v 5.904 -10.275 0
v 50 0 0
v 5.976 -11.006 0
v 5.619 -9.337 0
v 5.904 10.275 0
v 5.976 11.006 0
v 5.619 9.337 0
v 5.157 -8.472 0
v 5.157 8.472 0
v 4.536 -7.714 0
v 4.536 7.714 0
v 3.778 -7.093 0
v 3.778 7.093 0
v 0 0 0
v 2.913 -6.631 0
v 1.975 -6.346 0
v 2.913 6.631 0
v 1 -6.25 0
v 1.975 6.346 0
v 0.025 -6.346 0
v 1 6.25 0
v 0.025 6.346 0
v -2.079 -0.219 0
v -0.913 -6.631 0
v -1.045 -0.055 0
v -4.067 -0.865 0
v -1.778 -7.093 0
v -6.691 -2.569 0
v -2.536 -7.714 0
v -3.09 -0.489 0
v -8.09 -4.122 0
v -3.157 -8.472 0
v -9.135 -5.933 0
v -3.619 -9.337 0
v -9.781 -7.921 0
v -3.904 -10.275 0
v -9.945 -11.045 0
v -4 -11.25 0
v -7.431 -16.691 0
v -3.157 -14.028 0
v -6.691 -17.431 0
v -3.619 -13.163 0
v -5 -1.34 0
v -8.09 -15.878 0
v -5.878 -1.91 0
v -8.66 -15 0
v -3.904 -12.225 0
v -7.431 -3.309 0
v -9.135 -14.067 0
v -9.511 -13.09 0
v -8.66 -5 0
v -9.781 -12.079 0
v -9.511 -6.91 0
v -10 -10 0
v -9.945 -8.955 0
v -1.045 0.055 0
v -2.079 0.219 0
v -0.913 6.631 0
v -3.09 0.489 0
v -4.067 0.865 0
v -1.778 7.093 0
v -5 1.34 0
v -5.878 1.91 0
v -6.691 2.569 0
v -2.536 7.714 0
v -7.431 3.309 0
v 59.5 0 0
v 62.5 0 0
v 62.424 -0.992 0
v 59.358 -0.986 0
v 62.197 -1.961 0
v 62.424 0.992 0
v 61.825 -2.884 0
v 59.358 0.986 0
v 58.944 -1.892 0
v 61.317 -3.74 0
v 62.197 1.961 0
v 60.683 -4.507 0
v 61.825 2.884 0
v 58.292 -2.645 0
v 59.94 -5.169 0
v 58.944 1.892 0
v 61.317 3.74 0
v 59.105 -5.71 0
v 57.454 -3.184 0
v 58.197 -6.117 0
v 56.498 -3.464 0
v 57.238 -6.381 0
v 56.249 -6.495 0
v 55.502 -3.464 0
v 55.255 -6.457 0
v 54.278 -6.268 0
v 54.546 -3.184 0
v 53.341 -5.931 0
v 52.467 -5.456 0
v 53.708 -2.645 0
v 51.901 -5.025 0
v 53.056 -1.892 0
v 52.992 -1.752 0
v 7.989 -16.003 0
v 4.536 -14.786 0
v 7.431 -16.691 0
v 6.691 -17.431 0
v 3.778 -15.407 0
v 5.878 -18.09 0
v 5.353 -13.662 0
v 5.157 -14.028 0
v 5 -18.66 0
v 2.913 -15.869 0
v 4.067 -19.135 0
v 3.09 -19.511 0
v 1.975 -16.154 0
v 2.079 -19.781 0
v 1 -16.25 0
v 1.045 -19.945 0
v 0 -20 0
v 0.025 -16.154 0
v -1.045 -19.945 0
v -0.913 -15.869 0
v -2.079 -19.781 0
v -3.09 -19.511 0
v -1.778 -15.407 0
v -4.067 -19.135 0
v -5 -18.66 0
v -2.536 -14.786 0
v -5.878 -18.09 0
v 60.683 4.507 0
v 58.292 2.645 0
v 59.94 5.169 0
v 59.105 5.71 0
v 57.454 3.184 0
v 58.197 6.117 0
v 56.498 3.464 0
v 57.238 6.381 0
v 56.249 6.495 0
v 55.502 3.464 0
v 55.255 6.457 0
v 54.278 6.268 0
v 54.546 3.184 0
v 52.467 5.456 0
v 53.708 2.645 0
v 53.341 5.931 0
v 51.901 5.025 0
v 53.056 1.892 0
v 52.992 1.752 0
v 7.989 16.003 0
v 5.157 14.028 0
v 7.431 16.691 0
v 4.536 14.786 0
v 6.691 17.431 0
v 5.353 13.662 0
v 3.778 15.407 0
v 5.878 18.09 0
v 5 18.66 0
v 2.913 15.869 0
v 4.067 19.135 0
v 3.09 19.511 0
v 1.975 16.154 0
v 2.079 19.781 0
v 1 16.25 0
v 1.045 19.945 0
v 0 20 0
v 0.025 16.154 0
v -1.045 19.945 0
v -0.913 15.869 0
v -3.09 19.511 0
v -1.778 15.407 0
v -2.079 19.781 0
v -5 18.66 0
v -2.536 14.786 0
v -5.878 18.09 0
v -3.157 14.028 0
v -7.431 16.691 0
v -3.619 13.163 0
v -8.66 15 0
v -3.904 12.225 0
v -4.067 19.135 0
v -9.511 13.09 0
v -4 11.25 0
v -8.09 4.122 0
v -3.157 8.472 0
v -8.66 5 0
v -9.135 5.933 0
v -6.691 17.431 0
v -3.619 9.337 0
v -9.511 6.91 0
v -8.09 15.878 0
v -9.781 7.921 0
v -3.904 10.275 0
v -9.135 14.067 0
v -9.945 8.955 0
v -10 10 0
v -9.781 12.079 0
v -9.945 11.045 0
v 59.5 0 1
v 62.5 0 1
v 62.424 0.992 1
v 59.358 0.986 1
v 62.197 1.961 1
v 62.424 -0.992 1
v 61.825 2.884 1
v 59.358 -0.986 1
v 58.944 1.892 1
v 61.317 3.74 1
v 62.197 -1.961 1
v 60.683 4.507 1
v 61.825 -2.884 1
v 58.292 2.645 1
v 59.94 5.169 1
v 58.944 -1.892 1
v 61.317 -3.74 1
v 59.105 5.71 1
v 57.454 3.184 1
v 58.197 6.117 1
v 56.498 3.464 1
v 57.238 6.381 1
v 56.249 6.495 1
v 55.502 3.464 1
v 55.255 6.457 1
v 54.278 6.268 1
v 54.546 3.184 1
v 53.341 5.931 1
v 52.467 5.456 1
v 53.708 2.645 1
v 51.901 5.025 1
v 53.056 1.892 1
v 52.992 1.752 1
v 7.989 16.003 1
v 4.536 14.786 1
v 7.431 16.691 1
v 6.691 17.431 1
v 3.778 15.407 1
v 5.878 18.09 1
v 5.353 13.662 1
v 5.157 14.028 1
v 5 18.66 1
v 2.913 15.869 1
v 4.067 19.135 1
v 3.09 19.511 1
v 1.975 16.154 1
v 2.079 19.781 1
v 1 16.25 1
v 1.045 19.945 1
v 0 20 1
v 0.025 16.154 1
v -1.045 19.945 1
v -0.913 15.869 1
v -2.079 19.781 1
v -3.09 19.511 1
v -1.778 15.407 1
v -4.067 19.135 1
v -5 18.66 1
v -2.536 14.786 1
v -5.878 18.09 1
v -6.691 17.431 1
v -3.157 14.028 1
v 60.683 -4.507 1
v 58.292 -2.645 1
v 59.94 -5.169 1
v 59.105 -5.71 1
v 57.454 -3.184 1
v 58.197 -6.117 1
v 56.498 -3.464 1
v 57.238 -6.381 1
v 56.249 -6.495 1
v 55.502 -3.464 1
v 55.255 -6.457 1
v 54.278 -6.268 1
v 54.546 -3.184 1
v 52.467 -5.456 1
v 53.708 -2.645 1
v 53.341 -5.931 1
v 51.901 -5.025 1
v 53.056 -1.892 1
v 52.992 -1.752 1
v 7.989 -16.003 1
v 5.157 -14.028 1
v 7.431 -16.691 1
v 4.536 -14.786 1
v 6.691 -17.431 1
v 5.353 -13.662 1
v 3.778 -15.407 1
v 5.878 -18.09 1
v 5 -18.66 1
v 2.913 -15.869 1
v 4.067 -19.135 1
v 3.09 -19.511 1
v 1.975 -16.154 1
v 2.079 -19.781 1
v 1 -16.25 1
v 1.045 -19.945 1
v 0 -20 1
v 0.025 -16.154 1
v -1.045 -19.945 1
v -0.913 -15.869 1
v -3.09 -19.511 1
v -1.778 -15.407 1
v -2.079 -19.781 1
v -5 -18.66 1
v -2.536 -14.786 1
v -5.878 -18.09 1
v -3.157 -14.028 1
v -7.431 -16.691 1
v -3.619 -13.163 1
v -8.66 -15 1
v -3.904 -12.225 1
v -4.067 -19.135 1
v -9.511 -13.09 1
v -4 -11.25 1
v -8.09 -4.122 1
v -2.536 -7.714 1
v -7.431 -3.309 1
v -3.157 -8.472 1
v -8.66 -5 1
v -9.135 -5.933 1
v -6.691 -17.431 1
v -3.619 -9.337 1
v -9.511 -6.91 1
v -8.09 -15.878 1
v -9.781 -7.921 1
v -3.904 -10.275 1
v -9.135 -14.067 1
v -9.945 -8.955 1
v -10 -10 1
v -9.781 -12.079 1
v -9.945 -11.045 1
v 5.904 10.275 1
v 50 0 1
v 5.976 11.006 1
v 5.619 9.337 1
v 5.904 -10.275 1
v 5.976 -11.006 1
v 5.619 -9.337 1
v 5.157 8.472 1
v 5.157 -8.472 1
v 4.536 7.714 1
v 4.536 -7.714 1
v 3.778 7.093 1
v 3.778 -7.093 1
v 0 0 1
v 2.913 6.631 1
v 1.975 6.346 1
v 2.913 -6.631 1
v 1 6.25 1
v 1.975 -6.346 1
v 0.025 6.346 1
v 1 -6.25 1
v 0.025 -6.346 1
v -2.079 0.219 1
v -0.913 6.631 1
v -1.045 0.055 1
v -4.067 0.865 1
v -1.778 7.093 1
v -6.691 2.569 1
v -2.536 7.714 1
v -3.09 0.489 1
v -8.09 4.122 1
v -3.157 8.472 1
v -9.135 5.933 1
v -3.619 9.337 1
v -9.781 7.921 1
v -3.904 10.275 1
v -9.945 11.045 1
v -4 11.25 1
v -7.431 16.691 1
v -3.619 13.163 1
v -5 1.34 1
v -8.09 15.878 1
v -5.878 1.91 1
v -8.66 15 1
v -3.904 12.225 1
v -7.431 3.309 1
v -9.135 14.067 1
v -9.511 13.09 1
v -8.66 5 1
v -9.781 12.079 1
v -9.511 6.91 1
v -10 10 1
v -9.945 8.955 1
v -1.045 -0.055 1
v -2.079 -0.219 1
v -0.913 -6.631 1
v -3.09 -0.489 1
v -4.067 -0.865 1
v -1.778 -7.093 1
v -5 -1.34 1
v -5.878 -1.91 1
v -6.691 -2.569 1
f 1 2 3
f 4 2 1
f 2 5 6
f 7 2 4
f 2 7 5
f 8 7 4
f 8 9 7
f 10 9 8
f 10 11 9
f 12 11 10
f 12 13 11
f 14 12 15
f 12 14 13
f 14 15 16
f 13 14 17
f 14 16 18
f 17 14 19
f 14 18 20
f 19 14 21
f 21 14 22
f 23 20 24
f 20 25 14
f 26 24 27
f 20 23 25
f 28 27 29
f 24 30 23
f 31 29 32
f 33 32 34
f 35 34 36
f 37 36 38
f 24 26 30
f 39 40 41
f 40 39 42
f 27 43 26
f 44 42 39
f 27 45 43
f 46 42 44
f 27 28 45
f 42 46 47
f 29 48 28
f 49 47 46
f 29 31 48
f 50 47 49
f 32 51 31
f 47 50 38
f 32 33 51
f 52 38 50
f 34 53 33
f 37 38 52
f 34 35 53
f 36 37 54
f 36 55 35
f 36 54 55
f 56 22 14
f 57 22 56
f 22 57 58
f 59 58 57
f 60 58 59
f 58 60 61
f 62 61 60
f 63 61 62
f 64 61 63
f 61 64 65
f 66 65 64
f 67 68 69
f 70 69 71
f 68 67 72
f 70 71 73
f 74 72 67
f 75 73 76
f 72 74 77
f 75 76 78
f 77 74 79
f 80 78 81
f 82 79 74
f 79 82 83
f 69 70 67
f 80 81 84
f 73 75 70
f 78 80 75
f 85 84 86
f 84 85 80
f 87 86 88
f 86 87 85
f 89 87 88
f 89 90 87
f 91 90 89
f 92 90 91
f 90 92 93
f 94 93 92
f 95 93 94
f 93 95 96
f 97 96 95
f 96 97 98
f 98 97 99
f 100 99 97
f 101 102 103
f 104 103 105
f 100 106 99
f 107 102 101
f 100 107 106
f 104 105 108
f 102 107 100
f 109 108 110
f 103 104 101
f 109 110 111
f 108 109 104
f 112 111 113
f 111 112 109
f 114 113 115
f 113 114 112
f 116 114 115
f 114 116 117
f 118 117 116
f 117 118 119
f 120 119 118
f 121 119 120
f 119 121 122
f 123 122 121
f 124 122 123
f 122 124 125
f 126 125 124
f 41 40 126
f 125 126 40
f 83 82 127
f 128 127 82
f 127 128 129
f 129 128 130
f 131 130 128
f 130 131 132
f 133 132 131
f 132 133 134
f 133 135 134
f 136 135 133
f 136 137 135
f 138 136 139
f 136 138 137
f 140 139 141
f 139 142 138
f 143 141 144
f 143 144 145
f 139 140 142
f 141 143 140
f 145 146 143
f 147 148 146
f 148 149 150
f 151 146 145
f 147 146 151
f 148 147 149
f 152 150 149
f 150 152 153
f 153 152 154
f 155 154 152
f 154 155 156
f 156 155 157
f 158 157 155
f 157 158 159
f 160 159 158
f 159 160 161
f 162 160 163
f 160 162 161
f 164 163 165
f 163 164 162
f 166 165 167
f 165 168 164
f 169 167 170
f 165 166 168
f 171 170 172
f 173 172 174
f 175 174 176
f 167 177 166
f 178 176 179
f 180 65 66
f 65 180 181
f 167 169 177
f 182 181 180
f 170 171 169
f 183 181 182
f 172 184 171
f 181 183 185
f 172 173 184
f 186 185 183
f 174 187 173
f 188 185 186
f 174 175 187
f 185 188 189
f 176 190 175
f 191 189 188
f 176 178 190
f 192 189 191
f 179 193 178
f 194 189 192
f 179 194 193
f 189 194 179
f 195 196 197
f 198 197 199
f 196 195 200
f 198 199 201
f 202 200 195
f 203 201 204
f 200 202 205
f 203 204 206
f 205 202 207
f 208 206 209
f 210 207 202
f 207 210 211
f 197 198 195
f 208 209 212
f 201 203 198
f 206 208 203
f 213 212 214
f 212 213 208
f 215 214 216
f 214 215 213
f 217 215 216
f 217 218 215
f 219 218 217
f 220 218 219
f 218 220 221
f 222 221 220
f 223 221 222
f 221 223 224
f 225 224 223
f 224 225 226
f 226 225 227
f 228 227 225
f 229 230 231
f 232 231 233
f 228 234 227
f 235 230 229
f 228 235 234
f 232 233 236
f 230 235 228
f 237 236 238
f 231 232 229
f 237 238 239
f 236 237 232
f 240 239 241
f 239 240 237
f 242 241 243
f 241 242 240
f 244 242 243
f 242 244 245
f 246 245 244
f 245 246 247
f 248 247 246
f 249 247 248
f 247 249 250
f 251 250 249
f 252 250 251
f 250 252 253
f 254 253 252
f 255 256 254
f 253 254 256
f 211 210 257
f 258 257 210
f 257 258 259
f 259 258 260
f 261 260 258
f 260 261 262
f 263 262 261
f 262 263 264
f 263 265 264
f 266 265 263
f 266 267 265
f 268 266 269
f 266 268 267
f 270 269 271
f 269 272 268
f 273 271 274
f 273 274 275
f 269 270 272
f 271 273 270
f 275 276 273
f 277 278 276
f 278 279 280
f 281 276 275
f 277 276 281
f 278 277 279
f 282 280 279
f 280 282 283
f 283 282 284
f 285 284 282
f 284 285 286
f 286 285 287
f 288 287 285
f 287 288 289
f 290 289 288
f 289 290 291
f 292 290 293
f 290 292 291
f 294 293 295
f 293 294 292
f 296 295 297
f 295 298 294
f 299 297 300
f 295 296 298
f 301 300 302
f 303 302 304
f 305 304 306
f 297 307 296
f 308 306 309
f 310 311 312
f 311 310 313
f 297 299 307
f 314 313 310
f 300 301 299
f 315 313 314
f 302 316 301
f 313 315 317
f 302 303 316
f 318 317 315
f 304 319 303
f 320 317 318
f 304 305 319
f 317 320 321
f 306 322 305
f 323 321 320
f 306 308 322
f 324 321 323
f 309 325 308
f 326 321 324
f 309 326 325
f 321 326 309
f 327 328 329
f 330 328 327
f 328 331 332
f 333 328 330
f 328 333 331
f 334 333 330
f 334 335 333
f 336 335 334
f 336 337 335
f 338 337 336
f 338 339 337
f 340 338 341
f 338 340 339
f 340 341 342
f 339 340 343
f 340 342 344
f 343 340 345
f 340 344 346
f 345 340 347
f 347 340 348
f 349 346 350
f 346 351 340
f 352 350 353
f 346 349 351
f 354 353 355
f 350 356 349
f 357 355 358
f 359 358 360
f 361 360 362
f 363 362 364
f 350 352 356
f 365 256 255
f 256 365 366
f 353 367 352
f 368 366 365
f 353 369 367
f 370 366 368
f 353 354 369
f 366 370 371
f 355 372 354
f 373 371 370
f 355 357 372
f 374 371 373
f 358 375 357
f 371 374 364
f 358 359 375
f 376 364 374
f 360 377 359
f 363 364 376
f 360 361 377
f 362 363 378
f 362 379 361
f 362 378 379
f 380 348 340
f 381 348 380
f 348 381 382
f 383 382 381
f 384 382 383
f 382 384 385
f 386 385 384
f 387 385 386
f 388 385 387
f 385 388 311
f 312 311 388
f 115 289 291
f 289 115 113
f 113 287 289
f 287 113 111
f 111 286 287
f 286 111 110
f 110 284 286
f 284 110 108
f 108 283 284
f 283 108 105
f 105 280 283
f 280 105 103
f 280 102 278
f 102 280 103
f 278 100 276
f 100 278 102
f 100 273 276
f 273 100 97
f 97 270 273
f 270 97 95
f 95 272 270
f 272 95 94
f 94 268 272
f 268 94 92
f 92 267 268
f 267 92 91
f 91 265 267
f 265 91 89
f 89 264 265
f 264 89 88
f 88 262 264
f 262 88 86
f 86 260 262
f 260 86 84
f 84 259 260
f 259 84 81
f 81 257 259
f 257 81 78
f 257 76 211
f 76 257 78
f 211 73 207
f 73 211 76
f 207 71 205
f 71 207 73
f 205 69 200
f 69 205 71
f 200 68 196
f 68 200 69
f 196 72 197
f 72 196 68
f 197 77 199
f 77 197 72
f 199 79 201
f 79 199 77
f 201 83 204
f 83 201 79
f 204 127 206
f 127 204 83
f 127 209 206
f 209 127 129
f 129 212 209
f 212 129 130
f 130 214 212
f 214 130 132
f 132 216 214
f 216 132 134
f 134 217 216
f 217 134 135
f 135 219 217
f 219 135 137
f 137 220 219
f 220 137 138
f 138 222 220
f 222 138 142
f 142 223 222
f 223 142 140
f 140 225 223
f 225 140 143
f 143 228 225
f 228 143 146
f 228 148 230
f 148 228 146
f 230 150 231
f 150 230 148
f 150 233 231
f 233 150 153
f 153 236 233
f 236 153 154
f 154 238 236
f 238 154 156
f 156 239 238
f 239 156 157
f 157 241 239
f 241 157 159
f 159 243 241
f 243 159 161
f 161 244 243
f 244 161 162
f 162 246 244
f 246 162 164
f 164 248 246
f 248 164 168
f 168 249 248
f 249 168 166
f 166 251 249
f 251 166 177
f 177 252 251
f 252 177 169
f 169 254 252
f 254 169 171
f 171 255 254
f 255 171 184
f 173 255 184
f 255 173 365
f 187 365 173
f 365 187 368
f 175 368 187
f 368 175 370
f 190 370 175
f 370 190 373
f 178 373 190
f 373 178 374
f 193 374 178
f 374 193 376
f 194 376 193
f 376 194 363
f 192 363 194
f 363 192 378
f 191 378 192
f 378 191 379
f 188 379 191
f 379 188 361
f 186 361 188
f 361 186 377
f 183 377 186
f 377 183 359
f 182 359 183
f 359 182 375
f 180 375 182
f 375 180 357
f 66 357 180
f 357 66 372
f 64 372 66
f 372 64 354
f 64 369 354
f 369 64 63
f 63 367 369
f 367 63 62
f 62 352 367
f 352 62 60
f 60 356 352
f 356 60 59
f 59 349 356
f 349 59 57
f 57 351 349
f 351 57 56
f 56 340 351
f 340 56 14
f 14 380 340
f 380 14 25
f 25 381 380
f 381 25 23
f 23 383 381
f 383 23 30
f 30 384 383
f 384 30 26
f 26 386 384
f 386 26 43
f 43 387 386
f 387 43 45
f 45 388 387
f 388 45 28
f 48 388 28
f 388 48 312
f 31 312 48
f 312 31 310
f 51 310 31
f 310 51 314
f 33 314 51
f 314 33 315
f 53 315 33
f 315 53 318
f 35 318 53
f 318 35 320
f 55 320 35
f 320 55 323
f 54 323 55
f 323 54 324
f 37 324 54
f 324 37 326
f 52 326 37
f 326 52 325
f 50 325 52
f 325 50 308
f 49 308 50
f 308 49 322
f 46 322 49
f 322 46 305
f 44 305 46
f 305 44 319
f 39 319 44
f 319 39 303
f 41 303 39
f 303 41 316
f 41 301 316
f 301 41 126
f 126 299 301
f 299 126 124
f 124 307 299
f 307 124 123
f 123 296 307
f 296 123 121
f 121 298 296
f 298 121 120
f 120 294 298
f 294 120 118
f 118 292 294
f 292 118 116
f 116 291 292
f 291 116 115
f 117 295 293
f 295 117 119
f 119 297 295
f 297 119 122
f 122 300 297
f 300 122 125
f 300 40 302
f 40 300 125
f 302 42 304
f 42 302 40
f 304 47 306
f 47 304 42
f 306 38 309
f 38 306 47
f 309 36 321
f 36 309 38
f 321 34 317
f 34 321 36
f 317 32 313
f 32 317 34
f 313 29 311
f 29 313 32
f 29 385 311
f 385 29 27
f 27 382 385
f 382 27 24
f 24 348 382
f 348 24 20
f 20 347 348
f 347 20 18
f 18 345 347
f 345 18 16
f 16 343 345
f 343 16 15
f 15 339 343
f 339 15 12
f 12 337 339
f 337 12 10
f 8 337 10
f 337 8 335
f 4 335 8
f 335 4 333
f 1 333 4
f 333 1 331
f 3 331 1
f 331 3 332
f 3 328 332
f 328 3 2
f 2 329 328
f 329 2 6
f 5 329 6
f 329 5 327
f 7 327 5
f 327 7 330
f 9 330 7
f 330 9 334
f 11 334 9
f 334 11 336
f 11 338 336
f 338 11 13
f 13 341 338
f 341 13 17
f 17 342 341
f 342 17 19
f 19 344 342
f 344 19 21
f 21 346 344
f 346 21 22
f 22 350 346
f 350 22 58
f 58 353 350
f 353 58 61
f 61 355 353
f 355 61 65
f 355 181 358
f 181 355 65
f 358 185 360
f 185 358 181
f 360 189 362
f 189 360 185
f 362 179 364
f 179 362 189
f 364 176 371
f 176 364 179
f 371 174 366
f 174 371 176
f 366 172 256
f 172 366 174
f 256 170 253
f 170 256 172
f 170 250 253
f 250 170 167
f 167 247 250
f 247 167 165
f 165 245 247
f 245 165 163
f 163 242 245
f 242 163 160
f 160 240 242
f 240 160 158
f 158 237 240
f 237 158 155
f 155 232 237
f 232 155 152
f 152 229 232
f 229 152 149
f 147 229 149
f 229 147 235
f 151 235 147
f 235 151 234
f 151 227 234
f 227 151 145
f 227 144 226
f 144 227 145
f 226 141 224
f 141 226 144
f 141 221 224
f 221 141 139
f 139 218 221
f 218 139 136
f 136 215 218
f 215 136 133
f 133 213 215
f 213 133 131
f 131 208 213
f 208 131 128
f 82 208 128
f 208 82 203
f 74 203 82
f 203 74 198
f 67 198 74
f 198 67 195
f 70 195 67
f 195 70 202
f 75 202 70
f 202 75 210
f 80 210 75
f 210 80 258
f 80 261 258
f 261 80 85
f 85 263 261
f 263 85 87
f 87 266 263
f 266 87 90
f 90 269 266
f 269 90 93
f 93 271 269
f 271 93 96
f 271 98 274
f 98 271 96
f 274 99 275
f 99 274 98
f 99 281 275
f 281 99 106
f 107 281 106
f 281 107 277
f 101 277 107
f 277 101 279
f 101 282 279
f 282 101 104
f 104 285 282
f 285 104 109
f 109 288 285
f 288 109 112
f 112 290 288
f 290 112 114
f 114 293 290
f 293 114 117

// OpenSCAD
//
// Swag Paper Clip / Bookmark
//
//   text or logo is set using the SPC_text.png image
//
//   all measurements are in mm
//
//
// top circle radius
tr = 10;
// top circle offset (distance from centerline)
to = 10;
// top hole radius
hr = 5;
// top hole offsets
hx = 1;
hy = 1.25;

// bottom circle radius
br = 6.5;
// bottom circle distance (distance from top circle diagonal)
bd = 56;
// triangle top offsets
ot = 18;
// triangle bottom offsets
ob = 4;

// outside clip width
ow = 3;
// outside clip distance to inner
od = 2.5;

// clip thickness
ch = 1;

// text sizing in text() statement

// facet settings to make more accurate circles
$fa = 6;
$fs = 1;

	difference() {
	// extrude the 2D clip object
	linear_extrude(height = ch, center = false)

		difference() {

			// create the overall object
			union() {
				// bottom circle
				translate([bd, 0, 0])
					circle(br);
				// top circles
				translate([0, to, 0])
					circle(tr);
				translate([0, -to, 0])
					circle(tr);
				// body triangle
				polygon(points=[[0, ot],[0, -ot],[bd, -ob],[bd, ob]]);
			}

			//exclude the bottom hole
			translate([bd, 0, 0])
				circle(br - ow);

			//exclude the top holes
			translate([hx, to + hy, 0])
					circle(hr);
			translate([hx, -to - hy, 0])
					circle(hr);

			// top diagonal
			polygon(points=[[0, ot-ow-od],[0, ot-ow],
				  [bd, ob-ow],[bd, ob-ow-od]]);

			// bottom diagonal
			polygon(points=[[0, -ot + ow + od],[0, -ot + ow],
				  [bd, ow-ob],[bd, ow+od-ob]]);

		}
				// finally, "subtract" the text using the SPC_text image
			translate([0.65, 3.8, 5])
				mirror([0,1,0])
					scale([0.117, 0.117, 0.117])
						surface(file = "SPC_text.png", center = false, convexity = 30,invert = true);

	}
